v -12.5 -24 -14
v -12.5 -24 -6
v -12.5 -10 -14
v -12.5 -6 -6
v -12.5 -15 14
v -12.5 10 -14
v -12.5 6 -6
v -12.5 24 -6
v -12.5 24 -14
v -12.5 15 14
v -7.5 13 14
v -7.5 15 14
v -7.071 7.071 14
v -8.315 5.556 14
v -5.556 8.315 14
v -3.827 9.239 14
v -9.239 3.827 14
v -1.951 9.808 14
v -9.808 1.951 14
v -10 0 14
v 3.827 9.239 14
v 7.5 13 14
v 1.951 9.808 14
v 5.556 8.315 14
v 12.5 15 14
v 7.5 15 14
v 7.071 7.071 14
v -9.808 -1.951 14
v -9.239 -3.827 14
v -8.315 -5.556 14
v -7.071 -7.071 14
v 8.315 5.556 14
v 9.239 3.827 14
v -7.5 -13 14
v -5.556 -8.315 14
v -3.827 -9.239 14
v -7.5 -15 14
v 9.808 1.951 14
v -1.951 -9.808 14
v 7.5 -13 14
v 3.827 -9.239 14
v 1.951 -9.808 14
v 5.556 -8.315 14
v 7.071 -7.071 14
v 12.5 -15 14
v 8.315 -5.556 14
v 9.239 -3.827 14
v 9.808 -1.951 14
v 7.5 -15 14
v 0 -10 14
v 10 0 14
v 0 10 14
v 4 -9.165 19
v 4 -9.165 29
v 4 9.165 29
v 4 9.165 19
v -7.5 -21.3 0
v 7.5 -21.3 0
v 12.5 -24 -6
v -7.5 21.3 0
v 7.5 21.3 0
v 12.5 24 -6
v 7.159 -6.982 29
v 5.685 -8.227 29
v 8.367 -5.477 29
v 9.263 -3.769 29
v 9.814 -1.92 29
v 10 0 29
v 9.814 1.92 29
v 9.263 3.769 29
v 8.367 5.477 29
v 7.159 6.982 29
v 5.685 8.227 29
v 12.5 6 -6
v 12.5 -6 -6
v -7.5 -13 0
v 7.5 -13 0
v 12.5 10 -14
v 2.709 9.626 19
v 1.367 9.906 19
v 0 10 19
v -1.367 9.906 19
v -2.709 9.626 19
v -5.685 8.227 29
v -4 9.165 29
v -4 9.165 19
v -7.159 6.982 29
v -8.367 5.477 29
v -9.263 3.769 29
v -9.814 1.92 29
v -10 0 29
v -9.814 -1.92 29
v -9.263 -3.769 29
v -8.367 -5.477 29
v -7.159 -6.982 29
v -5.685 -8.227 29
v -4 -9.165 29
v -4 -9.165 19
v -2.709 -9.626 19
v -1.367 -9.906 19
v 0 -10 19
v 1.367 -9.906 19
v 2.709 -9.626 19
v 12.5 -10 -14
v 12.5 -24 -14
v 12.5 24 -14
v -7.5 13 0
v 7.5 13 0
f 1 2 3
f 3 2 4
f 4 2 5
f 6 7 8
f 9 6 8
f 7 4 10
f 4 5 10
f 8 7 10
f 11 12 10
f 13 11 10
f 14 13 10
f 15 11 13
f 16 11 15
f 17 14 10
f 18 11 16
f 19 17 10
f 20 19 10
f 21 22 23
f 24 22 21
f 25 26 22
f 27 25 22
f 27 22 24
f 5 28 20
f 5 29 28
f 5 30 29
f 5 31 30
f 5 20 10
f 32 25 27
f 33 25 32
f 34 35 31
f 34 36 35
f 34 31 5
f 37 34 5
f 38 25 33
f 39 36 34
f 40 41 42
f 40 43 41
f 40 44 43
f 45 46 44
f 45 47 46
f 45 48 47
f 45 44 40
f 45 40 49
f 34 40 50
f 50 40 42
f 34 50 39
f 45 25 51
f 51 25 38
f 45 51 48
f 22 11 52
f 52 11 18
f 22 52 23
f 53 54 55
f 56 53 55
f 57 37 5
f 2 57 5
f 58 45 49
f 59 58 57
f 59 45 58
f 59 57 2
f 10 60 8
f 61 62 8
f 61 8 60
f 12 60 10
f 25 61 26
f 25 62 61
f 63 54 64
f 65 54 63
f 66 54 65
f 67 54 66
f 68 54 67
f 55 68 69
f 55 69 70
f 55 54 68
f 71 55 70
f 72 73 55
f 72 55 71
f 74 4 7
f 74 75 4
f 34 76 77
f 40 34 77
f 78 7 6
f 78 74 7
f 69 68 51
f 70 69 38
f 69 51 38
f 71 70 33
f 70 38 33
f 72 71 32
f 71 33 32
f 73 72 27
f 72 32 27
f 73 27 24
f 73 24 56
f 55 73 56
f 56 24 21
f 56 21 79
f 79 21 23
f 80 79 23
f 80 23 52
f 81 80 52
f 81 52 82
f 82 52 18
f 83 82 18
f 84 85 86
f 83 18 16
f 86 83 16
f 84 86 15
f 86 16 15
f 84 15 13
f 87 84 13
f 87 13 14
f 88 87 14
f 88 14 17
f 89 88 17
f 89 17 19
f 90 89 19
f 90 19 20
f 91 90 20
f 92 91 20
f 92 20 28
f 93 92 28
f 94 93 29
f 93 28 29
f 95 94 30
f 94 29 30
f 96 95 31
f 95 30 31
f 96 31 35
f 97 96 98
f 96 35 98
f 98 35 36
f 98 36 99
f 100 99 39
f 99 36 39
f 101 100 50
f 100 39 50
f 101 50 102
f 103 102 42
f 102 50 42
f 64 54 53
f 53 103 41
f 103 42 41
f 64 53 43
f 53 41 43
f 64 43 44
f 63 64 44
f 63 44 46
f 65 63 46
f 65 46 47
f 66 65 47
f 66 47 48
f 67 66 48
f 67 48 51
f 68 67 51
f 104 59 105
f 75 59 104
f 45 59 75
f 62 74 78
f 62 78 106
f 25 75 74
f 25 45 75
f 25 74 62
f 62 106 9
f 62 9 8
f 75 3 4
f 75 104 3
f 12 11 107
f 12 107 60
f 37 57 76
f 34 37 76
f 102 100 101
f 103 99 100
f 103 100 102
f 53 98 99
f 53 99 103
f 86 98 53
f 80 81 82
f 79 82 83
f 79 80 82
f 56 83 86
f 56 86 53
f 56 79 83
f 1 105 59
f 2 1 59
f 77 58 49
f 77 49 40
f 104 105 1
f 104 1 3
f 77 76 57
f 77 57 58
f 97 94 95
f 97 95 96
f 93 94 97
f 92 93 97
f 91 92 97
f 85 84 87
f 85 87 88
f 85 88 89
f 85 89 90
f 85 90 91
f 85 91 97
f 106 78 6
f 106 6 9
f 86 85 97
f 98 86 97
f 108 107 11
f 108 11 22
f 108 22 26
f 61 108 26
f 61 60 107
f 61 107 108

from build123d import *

# Parameters (mm, degrees)
F0_W     = 9
F0_H     = 8
F0_W_2   = 5
F0_H_2   = 18
F0_W_3   = 10
F0_H_3   = 2
F1_DEPTH = 12.5
F2_R     = 10
F3_DEPTH = 15
F5_DEPTH = 10
F6_W     = 15
F6_H     = 8.3
F7_DEPTH = 14


with BuildPart() as f1:
    # F0 (on Right) → F1 (new body, symmetric)
    with BuildSketch(Plane.YZ):
        with Locations((-19.5, -10)):
            Rectangle(F0_W, F0_H)
        Polygon((-15, -6), (-15, -4), (-23.1, -4), (-24, -6), align=None)
        Polygon((-15, -4), (-15, 14), (-23.1, -4), align=None)
        with Locations((-12.5, 5)):
            Rectangle(F0_W_2, F0_H_2)
        with Locations((-7.5, 5)):
            Rectangle(F0_W_2, F0_H_2)
        with Locations((0, 5)):
            Rectangle(F0_W_3, F0_H_2)
        with Locations((7.5, 5)):
            Rectangle(F0_W_2, F0_H_2)
        with Locations((12.5, 5)):
            Rectangle(F0_W_2, F0_H_2)
        Polygon((23.1, -4), (15, 14), (15, -4), align=None)
        Polygon((23.1, -4), (15, -4), (15, -6), (24, -6), align=None)
        with Locations((19.5, -10)):
            Rectangle(F0_W, F0_H)
        with Locations((12.5, -10)):
            Rectangle(F0_W_2, F0_H)
        Polygon((10, -14), (10, -6), (6, -6), align=None)
        with Locations((12.5, -5)):
            Rectangle(F0_W_2, F0_H_3)
        with Locations((0, -5)):
            Rectangle(F0_W_3, F0_H_3)
        Polygon((-5, -6), (-5, -4), (-6, -6), align=None)
        Polygon((6, -6), (5, -4), (5, -6), align=None)
        Polygon((10, -6), (10, -4), (5, -4), (6, -6), align=None)
        Polygon((-6, -6), (-5, -4), (-10, -4), (-10, -6), align=None)
        Polygon((-10, -14), (-6, -6), (-10, -6), align=None)
        with Locations((-12.5, -10)):
            Rectangle(F0_W_2, F0_H)
        with Locations((-12.5, -5)):
            Rectangle(F0_W_2, F0_H_3)
    extrude(amount=F1_DEPTH, both=True)

    # F2 (on face) → F3 (join)
    with BuildSketch(Plane.XY.offset(14)):
        Circle(F2_R)
    extrude(amount=F3_DEPTH)

    # F4 (on face) → F5 (cut)
    with BuildSketch(Plane.XY.offset(29)):
        with BuildLine():
            ThreePointArc((4, 9.1651513899), (2.0430964369, 9.7890631293), (0, 10))
            ThreePointArc((0, 10), (-2.0430964369, 9.7890631293), (-4, 9.1651513899))
            Line((-4, 9.1651513899), (-4, -9.1651513899))
            ThreePointArc((-4, -9.1651513899), (-2.0430964369, -9.7890631293), (0, -10))
            ThreePointArc((0, -10), (2.0430964369, -9.7890631293), (4, -9.1651513899))
            Line((4, -9.1651513899), (4, 9.1651513899))
        make_face()
    extrude(amount=-F5_DEPTH, mode=Mode.SUBTRACT)

    # F6 (on Top) → F7 (cut)
    with BuildSketch(Plane.XY):
        with Locations((0, -17.15)):
            Rectangle(F6_W, F6_H)
        with Locations((0, 17.15)):
            Rectangle(F6_W, F6_H)
    extrude(amount=F7_DEPTH, mode=Mode.SUBTRACT)


solid = f1.part
